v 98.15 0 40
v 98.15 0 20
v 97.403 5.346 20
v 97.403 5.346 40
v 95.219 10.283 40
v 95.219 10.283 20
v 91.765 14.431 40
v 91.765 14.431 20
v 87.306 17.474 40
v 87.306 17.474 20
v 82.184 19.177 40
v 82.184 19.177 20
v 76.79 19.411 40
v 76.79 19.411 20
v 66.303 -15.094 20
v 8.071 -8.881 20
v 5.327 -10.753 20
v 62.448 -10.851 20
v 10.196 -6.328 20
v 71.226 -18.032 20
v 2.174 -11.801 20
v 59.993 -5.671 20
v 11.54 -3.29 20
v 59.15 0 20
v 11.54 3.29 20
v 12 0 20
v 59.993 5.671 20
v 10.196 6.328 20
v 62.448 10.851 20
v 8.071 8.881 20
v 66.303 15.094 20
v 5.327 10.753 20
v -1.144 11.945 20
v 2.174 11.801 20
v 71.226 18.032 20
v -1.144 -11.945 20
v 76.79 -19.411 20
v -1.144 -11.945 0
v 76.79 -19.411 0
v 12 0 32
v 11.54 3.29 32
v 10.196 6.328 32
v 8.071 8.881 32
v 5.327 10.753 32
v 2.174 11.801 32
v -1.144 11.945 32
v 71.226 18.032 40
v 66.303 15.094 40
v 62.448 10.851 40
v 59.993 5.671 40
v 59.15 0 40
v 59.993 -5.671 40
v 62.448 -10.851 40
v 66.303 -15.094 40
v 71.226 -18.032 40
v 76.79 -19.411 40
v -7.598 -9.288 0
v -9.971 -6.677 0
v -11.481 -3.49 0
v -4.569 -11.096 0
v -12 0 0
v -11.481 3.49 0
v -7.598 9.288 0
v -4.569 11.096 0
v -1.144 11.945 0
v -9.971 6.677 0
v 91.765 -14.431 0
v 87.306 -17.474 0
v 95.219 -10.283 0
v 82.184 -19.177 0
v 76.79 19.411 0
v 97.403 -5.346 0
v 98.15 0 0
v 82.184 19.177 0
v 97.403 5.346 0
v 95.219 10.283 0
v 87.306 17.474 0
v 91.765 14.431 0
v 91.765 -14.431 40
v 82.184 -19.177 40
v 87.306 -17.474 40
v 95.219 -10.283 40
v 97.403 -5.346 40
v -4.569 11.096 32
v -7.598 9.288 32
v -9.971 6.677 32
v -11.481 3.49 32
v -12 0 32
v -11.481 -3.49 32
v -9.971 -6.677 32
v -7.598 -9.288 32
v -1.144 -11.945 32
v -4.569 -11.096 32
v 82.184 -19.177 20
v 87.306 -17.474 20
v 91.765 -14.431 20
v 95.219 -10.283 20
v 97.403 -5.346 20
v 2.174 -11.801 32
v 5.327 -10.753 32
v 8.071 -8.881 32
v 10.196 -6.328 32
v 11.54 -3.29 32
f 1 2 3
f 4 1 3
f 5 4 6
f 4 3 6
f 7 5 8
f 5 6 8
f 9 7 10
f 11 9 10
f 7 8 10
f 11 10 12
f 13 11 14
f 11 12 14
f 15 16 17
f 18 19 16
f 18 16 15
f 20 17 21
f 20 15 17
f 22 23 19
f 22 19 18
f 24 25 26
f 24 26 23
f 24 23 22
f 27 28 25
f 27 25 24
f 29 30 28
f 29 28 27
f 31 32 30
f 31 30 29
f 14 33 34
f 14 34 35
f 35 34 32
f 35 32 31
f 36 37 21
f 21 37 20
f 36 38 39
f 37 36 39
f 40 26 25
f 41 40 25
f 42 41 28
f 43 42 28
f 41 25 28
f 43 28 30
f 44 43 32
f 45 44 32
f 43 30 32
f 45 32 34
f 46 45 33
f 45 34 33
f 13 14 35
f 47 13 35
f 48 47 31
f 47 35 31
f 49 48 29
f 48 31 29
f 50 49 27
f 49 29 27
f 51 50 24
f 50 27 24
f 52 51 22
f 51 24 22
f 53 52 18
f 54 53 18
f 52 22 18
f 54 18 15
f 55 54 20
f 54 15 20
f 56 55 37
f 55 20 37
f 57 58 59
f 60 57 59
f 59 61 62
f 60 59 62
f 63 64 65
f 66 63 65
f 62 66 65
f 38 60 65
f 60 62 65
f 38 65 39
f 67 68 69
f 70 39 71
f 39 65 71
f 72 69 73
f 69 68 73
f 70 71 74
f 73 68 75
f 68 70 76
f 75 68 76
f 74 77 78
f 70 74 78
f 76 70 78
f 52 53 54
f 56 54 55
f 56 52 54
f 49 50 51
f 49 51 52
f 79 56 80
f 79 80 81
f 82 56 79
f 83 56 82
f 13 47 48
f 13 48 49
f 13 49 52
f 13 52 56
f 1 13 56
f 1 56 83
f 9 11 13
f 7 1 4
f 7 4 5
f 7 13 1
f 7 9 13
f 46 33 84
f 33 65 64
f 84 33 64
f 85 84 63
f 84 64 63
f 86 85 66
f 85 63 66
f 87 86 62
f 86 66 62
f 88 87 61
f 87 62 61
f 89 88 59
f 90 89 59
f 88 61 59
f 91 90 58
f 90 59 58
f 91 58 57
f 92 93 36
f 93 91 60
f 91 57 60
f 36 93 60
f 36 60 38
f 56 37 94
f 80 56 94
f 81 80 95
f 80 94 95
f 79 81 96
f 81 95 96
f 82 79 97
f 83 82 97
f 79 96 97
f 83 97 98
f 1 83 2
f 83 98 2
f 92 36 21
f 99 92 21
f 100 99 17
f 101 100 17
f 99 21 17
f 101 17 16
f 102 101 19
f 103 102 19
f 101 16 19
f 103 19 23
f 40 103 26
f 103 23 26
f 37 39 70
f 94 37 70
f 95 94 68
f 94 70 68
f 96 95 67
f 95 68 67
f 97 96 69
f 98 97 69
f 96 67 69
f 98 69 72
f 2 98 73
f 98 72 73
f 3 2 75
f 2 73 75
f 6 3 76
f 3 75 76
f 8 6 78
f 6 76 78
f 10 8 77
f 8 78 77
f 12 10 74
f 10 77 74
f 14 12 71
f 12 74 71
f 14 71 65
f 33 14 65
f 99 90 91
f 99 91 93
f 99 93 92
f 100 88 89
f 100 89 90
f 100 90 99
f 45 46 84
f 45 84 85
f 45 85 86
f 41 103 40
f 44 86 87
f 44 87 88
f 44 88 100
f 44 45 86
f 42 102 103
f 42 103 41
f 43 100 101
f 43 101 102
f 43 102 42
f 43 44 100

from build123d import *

# Parameters (mm, degrees)
F1_DEPTH = 20
F3_DEPTH = 20
F5_DEPTH = 12


with BuildPart() as f1:
    # F0 (on Top) → F1 (new body)
    with BuildSketch(Plane.XY):
        with BuildLine():
            Line((76.790496, 19.411137), (-1.14431, 11.945315))
            ThreePointArc((-1.14431, 11.945315), (-12, 0), (-1.14431, -11.945315))
            Line((-1.14431, -11.945315), (76.790496, -19.411137))
            ThreePointArc((76.790496, -19.411137), (98.15, 0), (76.790496, 19.411137))
        make_face()
    extrude(amount=F1_DEPTH)

    # F2 (on face) → F3 (join)
    with BuildSketch(Plane.XY.offset(20)):
        with BuildLine():
            ThreePointArc((76.790496, -19.411137), (91.76468, -14.431049), (98.15, 0))
            ThreePointArc((98.15, 0), (91.76468, 14.431049), (76.790496, 19.411137))
            ThreePointArc((76.790496, 19.411137), (59.15, 0), (76.790496, -19.411137))
        make_face()
    extrude(amount=F3_DEPTH)

    # F4 (on face) → F5 (join)
    with BuildSketch(Plane.XY.offset(20)):
        with BuildLine():
            ThreePointArc((-1.14431, -11.945315), (8.070572, -8.880645), (12, 0))
            ThreePointArc((12, 0), (8.070572, 8.880645), (-1.14431, 11.945315))
            ThreePointArc((-1.14431, 11.945315), (-12, 0), (-1.14431, -11.945315))
        make_face()
    extrude(amount=F5_DEPTH)


solid = f1.part
